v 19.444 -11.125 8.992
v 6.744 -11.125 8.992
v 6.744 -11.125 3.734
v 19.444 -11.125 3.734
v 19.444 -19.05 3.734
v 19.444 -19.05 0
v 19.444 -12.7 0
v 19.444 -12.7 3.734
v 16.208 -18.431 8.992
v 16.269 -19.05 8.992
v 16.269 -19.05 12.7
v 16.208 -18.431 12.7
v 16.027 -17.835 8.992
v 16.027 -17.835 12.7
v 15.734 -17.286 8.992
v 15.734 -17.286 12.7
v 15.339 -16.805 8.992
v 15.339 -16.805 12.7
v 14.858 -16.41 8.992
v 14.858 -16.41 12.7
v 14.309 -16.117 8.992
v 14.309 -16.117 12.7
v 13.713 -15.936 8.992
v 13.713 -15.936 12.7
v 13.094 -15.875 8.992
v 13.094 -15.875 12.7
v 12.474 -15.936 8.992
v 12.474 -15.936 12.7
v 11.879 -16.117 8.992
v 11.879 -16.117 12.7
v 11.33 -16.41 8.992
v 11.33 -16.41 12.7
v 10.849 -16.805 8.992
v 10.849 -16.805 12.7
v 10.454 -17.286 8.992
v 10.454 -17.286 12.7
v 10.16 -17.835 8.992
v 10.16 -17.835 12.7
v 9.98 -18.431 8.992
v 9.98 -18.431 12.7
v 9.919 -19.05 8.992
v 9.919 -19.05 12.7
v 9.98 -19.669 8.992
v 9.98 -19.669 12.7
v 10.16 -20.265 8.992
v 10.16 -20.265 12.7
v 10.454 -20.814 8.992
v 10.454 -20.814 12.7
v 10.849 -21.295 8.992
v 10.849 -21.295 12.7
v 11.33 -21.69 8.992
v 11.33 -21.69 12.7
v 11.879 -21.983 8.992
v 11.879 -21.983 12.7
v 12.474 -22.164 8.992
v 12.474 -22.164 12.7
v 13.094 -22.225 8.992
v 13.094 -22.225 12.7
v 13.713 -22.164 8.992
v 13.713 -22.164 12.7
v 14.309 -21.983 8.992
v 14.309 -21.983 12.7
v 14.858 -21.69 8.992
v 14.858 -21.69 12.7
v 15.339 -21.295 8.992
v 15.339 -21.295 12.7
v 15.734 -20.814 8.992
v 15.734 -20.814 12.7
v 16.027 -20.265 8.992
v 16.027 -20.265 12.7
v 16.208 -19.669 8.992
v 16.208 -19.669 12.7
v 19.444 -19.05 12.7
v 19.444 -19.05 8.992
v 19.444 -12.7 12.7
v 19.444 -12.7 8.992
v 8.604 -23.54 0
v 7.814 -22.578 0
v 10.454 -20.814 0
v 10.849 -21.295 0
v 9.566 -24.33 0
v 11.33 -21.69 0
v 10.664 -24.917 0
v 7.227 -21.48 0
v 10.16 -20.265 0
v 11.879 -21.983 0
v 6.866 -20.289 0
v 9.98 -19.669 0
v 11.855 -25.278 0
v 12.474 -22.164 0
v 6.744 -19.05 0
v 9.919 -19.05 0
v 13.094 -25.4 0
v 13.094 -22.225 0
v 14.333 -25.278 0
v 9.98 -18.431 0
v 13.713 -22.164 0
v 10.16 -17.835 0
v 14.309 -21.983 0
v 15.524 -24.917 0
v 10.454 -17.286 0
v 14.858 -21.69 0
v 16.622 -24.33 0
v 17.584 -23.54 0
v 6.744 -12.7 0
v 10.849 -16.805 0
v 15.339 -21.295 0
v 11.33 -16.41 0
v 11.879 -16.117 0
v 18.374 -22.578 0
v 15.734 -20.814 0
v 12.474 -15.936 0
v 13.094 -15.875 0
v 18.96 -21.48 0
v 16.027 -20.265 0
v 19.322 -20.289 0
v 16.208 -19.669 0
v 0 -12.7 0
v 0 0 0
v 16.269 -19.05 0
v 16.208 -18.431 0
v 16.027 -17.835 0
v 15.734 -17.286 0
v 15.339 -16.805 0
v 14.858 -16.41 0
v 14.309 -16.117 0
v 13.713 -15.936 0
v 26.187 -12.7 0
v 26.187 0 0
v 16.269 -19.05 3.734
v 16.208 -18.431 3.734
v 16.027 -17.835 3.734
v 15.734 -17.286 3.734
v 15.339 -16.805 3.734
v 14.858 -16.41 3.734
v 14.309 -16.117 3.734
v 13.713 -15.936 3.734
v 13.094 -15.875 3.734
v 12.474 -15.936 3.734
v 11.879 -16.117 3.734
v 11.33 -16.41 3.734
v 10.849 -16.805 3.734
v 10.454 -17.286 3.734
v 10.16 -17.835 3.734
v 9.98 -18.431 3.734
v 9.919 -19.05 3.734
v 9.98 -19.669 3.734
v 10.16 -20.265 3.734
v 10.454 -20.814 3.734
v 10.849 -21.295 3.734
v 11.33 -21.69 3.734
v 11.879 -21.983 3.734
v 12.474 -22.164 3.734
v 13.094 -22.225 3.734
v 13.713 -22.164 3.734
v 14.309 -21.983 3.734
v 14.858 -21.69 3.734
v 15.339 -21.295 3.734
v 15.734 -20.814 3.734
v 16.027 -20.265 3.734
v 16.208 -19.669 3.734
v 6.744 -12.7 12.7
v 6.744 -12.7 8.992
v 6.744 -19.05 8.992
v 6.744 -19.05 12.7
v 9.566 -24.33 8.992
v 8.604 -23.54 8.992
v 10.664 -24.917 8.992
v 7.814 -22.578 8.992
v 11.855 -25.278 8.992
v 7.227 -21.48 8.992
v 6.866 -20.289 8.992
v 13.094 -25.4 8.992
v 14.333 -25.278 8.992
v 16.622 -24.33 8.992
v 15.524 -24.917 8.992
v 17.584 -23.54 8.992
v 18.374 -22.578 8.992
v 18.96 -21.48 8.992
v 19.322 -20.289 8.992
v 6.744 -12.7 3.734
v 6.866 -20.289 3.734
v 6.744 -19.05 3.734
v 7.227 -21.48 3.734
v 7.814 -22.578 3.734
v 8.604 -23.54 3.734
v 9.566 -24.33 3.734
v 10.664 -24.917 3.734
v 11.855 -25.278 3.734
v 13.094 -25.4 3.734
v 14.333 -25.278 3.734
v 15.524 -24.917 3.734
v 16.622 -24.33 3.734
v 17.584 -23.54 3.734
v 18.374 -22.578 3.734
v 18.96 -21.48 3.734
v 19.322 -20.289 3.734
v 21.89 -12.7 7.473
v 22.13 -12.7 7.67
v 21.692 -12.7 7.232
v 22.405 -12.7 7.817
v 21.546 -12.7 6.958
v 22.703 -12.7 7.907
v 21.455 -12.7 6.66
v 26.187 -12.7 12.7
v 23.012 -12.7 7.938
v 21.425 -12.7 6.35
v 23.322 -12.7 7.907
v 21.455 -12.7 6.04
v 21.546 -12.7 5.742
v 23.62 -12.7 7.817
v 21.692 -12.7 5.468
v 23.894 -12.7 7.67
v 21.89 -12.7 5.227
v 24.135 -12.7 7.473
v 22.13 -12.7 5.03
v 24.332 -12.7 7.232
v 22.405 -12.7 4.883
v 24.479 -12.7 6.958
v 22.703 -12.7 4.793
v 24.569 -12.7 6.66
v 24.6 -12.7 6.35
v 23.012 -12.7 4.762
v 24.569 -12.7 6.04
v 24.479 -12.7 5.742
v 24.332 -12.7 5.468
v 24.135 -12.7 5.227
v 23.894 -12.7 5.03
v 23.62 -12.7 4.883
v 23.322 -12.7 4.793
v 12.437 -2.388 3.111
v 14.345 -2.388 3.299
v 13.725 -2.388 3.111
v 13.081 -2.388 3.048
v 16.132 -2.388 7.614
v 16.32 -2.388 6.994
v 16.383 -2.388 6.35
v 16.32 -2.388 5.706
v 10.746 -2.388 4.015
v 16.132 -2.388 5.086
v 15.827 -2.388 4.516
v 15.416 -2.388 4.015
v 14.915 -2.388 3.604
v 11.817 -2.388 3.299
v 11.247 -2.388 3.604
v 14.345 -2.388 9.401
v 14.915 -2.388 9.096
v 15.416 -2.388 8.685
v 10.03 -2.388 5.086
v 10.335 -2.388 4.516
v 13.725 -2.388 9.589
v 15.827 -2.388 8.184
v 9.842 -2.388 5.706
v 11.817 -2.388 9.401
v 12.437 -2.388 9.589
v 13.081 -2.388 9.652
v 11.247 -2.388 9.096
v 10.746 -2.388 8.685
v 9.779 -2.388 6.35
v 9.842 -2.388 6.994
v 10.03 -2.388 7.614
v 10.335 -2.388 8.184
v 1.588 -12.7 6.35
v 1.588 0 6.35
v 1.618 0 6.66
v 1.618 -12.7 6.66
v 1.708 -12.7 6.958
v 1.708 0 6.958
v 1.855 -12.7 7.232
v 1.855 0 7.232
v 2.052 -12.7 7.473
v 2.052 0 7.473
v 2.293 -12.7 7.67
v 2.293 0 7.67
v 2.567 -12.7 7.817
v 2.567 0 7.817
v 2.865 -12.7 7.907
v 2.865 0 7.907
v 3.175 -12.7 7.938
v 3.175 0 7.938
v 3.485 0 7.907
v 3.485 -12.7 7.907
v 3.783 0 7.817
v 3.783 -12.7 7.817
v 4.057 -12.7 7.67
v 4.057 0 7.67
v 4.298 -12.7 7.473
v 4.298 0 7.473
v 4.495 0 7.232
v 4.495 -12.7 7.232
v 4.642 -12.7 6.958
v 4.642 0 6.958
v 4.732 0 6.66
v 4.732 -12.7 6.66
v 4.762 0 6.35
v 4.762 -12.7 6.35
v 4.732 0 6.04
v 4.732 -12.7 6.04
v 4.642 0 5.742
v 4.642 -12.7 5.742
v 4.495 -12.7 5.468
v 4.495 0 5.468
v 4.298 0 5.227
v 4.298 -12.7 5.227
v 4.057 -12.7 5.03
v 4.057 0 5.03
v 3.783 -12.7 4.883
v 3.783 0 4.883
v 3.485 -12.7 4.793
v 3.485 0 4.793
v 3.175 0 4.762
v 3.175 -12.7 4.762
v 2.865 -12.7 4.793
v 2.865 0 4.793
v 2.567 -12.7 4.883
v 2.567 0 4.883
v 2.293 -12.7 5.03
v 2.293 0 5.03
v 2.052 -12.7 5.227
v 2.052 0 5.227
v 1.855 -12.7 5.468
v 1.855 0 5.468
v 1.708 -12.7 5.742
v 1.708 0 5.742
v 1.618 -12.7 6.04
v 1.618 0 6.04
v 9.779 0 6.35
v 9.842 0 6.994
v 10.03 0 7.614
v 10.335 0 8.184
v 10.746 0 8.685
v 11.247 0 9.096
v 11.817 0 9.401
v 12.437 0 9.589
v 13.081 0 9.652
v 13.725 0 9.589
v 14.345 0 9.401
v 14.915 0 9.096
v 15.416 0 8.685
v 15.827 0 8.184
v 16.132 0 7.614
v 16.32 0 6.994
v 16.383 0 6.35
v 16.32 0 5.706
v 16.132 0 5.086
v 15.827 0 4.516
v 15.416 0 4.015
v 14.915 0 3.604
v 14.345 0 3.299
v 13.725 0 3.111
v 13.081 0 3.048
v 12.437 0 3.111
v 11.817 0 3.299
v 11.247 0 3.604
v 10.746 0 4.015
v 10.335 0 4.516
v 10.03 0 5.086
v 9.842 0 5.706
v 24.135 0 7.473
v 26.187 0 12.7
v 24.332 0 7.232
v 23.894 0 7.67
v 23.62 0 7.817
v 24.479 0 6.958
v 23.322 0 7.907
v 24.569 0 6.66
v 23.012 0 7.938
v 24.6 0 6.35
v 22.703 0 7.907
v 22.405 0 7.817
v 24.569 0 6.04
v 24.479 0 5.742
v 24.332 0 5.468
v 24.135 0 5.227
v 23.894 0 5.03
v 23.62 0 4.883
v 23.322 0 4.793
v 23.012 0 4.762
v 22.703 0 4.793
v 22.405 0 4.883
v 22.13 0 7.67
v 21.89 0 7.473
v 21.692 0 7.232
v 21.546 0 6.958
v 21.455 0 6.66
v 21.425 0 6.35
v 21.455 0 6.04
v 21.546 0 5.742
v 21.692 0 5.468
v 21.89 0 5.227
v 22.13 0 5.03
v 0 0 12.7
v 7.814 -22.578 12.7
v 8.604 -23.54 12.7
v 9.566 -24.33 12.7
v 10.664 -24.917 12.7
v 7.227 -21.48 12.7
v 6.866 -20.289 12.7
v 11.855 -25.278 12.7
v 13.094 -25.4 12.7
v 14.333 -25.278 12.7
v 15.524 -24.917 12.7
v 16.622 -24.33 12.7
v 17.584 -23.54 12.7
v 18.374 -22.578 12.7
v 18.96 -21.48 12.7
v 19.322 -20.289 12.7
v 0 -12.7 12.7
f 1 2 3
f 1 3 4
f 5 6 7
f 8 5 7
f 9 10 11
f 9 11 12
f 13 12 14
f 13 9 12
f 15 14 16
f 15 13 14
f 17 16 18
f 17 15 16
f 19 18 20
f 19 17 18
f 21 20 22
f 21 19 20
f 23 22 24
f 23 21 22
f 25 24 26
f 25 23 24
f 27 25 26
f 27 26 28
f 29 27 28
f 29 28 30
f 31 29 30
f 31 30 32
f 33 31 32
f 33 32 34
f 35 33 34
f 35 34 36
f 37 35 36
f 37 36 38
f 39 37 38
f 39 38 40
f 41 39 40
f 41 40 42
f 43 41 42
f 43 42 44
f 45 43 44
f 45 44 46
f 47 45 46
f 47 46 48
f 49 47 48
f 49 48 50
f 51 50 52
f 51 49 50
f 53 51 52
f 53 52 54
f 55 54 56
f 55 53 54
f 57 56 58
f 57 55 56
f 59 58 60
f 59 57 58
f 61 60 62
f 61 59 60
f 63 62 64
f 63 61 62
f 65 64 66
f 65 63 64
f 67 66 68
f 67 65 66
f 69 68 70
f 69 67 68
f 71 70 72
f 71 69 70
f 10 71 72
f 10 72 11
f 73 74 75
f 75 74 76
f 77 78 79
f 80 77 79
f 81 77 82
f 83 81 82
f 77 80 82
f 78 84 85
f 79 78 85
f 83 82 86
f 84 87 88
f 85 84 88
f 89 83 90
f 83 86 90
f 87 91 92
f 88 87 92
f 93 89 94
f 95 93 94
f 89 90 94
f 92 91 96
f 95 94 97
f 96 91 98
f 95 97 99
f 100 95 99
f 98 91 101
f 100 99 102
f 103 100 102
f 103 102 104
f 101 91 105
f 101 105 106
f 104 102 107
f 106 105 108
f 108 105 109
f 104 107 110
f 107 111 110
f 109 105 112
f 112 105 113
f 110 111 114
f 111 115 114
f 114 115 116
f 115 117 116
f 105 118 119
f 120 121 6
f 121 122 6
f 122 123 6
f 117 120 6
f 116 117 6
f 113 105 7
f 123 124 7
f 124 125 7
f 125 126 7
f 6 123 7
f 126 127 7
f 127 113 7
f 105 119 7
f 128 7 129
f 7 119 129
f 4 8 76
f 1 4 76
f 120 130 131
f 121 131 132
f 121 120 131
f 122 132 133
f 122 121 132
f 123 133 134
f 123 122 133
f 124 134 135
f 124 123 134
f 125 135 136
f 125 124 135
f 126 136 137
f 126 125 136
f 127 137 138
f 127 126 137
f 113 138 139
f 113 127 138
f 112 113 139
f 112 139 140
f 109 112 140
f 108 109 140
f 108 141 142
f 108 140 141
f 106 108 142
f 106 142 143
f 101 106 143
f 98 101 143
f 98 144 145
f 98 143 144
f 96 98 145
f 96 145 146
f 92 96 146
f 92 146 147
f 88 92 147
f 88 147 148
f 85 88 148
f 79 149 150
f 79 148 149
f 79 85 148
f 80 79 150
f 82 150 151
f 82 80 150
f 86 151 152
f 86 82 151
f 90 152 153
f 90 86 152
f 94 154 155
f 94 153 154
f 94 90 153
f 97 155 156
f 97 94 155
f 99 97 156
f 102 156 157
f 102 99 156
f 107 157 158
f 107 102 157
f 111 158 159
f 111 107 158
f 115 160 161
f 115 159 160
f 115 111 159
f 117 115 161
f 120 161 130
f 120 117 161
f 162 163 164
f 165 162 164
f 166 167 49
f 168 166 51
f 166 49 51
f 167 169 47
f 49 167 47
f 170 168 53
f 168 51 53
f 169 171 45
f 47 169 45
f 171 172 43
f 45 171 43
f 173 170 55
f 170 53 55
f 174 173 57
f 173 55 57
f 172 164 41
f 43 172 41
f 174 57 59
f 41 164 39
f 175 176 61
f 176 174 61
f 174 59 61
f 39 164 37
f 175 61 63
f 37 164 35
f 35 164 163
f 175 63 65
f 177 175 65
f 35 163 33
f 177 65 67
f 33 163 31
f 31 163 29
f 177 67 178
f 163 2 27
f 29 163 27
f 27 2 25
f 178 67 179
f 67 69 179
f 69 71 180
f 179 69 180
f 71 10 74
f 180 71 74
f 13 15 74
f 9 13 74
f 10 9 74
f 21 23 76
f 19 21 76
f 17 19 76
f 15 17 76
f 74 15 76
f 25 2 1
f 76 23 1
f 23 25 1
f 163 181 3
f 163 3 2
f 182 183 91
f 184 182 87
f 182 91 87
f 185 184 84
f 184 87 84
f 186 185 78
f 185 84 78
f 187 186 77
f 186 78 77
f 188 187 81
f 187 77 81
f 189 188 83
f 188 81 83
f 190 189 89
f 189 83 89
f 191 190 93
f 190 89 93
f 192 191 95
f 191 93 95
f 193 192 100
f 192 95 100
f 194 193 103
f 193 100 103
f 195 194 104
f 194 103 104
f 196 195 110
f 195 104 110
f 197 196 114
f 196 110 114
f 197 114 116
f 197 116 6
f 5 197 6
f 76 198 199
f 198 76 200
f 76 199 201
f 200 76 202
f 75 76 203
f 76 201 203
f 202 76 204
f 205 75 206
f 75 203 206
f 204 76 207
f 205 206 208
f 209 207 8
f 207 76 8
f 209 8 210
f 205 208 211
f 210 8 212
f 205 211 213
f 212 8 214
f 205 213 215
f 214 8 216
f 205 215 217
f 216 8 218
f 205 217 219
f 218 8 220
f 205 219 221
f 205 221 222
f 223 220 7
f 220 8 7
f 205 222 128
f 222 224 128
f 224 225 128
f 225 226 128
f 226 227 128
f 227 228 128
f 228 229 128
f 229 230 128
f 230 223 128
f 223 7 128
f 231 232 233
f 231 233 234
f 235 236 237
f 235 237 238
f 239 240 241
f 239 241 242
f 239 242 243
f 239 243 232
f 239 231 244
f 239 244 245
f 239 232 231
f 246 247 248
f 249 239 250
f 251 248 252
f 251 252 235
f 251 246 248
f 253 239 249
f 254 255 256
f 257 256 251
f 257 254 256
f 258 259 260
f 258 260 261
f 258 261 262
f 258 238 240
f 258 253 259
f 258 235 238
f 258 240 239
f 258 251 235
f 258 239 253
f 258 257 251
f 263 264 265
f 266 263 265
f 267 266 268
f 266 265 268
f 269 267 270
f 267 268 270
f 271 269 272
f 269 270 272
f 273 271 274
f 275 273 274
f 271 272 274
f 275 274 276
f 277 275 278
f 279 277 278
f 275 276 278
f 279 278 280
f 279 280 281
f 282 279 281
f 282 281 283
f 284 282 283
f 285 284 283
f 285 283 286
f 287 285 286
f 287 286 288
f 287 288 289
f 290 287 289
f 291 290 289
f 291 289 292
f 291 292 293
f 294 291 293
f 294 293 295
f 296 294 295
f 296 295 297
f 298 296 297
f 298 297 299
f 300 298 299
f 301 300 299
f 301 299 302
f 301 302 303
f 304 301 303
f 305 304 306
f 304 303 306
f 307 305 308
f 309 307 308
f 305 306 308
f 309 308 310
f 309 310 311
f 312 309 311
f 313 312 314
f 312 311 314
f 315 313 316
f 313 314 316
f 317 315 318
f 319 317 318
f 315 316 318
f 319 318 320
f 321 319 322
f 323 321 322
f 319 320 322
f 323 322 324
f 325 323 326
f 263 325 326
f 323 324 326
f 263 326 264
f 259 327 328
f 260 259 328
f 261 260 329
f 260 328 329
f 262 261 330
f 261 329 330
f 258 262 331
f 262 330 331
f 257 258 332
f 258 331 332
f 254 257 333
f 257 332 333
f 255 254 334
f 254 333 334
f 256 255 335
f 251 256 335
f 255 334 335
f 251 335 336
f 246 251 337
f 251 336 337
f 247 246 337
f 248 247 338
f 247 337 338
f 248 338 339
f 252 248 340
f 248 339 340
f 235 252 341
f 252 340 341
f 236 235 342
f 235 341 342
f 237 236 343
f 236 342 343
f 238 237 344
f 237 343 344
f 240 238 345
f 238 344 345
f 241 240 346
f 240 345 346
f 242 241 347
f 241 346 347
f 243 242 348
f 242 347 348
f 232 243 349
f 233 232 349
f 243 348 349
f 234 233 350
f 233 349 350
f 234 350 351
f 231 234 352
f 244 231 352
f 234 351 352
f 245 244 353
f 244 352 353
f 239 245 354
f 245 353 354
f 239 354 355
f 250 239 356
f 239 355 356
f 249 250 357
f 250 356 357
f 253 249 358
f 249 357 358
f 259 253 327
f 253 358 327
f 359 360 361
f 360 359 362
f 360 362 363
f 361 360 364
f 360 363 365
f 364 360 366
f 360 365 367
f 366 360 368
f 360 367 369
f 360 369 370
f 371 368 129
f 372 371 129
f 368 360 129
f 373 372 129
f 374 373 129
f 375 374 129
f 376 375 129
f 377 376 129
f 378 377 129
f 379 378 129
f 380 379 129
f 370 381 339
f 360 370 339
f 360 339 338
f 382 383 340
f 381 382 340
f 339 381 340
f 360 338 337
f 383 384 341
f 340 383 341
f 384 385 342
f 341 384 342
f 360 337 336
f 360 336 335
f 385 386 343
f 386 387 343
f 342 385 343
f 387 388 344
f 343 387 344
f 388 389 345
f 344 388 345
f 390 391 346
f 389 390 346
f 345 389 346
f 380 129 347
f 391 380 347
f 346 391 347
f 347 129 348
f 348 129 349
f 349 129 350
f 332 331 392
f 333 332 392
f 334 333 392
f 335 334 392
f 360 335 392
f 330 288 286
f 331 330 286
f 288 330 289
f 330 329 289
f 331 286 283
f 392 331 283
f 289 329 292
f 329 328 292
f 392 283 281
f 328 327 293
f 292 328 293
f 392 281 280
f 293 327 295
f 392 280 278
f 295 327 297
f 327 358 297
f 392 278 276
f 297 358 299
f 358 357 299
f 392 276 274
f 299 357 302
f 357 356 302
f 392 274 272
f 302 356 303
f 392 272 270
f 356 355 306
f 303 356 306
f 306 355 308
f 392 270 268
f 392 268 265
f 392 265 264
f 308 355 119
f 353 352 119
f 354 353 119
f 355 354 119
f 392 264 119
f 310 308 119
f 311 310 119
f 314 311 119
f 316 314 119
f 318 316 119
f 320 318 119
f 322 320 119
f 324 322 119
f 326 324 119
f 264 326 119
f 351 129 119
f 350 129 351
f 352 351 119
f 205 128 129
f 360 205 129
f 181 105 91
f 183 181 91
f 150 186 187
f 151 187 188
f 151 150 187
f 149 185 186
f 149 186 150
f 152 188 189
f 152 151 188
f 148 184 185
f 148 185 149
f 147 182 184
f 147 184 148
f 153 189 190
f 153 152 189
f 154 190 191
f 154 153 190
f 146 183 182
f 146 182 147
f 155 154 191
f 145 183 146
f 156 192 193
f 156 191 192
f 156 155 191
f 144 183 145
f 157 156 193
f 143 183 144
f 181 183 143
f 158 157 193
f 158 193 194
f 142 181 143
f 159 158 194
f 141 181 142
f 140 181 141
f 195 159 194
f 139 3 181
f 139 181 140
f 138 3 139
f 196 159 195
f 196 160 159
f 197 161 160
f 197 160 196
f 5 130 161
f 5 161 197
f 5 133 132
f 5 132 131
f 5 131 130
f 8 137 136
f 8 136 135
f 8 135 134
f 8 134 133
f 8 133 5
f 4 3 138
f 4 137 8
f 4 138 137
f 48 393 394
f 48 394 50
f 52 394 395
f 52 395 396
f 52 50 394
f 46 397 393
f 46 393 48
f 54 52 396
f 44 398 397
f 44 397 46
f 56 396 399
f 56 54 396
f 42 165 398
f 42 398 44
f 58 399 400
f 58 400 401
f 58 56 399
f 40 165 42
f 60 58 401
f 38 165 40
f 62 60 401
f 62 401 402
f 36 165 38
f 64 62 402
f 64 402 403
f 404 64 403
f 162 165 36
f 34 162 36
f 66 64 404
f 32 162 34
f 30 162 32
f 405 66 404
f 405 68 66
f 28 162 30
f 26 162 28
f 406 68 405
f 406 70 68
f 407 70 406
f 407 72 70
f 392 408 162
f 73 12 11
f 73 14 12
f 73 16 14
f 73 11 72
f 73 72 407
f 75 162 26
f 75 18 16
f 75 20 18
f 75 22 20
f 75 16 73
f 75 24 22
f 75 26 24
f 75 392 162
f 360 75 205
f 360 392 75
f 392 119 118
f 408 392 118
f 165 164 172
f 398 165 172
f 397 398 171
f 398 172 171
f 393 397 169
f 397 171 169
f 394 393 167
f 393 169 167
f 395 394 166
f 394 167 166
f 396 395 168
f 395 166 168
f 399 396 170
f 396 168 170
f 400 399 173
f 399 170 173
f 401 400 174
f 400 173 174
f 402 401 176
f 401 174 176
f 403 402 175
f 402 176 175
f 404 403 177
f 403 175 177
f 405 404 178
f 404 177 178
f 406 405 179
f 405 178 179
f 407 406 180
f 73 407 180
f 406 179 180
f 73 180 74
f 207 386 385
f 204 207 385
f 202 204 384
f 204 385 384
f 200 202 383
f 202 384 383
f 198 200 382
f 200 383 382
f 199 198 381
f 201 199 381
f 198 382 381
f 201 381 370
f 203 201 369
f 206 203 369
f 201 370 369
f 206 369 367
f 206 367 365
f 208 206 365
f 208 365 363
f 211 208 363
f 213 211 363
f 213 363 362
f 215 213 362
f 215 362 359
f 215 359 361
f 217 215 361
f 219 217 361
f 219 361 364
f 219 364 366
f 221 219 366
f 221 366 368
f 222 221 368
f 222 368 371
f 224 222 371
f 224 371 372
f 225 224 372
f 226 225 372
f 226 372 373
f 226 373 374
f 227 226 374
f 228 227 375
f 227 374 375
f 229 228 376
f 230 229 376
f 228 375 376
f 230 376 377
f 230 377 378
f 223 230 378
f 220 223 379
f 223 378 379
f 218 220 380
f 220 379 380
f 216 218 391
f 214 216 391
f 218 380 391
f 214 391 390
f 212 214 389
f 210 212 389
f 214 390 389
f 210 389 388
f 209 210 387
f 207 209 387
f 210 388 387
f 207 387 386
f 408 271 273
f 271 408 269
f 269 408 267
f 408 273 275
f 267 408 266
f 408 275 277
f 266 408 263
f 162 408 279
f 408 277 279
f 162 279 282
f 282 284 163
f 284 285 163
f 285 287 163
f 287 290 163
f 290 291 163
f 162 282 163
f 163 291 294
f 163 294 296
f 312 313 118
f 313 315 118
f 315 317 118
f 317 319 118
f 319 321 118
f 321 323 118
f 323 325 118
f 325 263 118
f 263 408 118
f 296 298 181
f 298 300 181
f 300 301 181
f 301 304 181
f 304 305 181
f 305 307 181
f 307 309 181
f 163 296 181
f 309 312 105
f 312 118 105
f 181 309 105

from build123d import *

# Parameters (mm, degrees)
F0_R     = 3.175
F1_DEPTH = 12.7
F2_R     = 1.5875
F3_DEPTH = 25.401
F4_R     = 3.302
F5_DEPTH = 2.3876
F6_W     = 12.7
F6_H     = 5.2578
F7_DEPTH = 12.701
F8_DEPTH = 1.5748


with BuildPart() as f1:
    # F0 (on Top) → F1 (new body)
    with BuildSketch(Plane.XY):
        with BuildLine():
            Line((26.1874, 0), (0, 0))
            Line((0, 0), (0, -12.7))
            Line((0, -12.7), (6.7437, -12.7))
            Line((6.7437, -12.7), (6.7437, -19.05))
            ThreePointArc((6.7437, -19.05), (13.0937, -25.4), (19.4437, -19.05))
            Line((19.4437, -19.05), (19.4437, -12.7))
            Line((19.4437, -12.7), (26.1874, -12.7))
            Line((26.1874, -12.7), (26.1874, 0))
        make_face()
        with Locations((13.0937, -19.05)):
            Circle(F0_R, mode=Mode.SUBTRACT)
    extrude(amount=F1_DEPTH)

    # F2 (on face) → F3 (cut, through all)
    with BuildSketch(Plane(origin=(0, 0, 0), x_dir=(-1, 0, 0), z_dir=(0, 1, 0))):
        with Locations((-3.175, 6.35)):
            Circle(F2_R)
        with Locations((-23.0124, 6.35)):
            Circle(F2_R)
    extrude(amount=-F3_DEPTH, mode=Mode.SUBTRACT)

    # F4 (on face) → F5 (cut)
    with BuildSketch(Plane(origin=(0, 0, 0), x_dir=(-1, 0, 0), z_dir=(0, 1, 0))):
        with Locations((-13.081, 6.35)):
            Circle(F4_R)
    extrude(amount=-F5_DEPTH, mode=Mode.SUBTRACT)

    # F6 (on face) → F7 (cut, through all)
    with BuildSketch(Plane.XZ.offset(12.7)):
        with Locations((13.0937, 6.3627)):
            Rectangle(F6_W, F6_H)
    extrude(amount=F7_DEPTH, mode=Mode.SUBTRACT)

    # F6 (on face) → F8 (cut)
    with BuildSketch(Plane.XZ.offset(12.7)):
        with Locations((13.0937, 6.3627)):
            Rectangle(F6_W, F6_H)
    extrude(amount=-F8_DEPTH, mode=Mode.SUBTRACT)


solid = f1.part
